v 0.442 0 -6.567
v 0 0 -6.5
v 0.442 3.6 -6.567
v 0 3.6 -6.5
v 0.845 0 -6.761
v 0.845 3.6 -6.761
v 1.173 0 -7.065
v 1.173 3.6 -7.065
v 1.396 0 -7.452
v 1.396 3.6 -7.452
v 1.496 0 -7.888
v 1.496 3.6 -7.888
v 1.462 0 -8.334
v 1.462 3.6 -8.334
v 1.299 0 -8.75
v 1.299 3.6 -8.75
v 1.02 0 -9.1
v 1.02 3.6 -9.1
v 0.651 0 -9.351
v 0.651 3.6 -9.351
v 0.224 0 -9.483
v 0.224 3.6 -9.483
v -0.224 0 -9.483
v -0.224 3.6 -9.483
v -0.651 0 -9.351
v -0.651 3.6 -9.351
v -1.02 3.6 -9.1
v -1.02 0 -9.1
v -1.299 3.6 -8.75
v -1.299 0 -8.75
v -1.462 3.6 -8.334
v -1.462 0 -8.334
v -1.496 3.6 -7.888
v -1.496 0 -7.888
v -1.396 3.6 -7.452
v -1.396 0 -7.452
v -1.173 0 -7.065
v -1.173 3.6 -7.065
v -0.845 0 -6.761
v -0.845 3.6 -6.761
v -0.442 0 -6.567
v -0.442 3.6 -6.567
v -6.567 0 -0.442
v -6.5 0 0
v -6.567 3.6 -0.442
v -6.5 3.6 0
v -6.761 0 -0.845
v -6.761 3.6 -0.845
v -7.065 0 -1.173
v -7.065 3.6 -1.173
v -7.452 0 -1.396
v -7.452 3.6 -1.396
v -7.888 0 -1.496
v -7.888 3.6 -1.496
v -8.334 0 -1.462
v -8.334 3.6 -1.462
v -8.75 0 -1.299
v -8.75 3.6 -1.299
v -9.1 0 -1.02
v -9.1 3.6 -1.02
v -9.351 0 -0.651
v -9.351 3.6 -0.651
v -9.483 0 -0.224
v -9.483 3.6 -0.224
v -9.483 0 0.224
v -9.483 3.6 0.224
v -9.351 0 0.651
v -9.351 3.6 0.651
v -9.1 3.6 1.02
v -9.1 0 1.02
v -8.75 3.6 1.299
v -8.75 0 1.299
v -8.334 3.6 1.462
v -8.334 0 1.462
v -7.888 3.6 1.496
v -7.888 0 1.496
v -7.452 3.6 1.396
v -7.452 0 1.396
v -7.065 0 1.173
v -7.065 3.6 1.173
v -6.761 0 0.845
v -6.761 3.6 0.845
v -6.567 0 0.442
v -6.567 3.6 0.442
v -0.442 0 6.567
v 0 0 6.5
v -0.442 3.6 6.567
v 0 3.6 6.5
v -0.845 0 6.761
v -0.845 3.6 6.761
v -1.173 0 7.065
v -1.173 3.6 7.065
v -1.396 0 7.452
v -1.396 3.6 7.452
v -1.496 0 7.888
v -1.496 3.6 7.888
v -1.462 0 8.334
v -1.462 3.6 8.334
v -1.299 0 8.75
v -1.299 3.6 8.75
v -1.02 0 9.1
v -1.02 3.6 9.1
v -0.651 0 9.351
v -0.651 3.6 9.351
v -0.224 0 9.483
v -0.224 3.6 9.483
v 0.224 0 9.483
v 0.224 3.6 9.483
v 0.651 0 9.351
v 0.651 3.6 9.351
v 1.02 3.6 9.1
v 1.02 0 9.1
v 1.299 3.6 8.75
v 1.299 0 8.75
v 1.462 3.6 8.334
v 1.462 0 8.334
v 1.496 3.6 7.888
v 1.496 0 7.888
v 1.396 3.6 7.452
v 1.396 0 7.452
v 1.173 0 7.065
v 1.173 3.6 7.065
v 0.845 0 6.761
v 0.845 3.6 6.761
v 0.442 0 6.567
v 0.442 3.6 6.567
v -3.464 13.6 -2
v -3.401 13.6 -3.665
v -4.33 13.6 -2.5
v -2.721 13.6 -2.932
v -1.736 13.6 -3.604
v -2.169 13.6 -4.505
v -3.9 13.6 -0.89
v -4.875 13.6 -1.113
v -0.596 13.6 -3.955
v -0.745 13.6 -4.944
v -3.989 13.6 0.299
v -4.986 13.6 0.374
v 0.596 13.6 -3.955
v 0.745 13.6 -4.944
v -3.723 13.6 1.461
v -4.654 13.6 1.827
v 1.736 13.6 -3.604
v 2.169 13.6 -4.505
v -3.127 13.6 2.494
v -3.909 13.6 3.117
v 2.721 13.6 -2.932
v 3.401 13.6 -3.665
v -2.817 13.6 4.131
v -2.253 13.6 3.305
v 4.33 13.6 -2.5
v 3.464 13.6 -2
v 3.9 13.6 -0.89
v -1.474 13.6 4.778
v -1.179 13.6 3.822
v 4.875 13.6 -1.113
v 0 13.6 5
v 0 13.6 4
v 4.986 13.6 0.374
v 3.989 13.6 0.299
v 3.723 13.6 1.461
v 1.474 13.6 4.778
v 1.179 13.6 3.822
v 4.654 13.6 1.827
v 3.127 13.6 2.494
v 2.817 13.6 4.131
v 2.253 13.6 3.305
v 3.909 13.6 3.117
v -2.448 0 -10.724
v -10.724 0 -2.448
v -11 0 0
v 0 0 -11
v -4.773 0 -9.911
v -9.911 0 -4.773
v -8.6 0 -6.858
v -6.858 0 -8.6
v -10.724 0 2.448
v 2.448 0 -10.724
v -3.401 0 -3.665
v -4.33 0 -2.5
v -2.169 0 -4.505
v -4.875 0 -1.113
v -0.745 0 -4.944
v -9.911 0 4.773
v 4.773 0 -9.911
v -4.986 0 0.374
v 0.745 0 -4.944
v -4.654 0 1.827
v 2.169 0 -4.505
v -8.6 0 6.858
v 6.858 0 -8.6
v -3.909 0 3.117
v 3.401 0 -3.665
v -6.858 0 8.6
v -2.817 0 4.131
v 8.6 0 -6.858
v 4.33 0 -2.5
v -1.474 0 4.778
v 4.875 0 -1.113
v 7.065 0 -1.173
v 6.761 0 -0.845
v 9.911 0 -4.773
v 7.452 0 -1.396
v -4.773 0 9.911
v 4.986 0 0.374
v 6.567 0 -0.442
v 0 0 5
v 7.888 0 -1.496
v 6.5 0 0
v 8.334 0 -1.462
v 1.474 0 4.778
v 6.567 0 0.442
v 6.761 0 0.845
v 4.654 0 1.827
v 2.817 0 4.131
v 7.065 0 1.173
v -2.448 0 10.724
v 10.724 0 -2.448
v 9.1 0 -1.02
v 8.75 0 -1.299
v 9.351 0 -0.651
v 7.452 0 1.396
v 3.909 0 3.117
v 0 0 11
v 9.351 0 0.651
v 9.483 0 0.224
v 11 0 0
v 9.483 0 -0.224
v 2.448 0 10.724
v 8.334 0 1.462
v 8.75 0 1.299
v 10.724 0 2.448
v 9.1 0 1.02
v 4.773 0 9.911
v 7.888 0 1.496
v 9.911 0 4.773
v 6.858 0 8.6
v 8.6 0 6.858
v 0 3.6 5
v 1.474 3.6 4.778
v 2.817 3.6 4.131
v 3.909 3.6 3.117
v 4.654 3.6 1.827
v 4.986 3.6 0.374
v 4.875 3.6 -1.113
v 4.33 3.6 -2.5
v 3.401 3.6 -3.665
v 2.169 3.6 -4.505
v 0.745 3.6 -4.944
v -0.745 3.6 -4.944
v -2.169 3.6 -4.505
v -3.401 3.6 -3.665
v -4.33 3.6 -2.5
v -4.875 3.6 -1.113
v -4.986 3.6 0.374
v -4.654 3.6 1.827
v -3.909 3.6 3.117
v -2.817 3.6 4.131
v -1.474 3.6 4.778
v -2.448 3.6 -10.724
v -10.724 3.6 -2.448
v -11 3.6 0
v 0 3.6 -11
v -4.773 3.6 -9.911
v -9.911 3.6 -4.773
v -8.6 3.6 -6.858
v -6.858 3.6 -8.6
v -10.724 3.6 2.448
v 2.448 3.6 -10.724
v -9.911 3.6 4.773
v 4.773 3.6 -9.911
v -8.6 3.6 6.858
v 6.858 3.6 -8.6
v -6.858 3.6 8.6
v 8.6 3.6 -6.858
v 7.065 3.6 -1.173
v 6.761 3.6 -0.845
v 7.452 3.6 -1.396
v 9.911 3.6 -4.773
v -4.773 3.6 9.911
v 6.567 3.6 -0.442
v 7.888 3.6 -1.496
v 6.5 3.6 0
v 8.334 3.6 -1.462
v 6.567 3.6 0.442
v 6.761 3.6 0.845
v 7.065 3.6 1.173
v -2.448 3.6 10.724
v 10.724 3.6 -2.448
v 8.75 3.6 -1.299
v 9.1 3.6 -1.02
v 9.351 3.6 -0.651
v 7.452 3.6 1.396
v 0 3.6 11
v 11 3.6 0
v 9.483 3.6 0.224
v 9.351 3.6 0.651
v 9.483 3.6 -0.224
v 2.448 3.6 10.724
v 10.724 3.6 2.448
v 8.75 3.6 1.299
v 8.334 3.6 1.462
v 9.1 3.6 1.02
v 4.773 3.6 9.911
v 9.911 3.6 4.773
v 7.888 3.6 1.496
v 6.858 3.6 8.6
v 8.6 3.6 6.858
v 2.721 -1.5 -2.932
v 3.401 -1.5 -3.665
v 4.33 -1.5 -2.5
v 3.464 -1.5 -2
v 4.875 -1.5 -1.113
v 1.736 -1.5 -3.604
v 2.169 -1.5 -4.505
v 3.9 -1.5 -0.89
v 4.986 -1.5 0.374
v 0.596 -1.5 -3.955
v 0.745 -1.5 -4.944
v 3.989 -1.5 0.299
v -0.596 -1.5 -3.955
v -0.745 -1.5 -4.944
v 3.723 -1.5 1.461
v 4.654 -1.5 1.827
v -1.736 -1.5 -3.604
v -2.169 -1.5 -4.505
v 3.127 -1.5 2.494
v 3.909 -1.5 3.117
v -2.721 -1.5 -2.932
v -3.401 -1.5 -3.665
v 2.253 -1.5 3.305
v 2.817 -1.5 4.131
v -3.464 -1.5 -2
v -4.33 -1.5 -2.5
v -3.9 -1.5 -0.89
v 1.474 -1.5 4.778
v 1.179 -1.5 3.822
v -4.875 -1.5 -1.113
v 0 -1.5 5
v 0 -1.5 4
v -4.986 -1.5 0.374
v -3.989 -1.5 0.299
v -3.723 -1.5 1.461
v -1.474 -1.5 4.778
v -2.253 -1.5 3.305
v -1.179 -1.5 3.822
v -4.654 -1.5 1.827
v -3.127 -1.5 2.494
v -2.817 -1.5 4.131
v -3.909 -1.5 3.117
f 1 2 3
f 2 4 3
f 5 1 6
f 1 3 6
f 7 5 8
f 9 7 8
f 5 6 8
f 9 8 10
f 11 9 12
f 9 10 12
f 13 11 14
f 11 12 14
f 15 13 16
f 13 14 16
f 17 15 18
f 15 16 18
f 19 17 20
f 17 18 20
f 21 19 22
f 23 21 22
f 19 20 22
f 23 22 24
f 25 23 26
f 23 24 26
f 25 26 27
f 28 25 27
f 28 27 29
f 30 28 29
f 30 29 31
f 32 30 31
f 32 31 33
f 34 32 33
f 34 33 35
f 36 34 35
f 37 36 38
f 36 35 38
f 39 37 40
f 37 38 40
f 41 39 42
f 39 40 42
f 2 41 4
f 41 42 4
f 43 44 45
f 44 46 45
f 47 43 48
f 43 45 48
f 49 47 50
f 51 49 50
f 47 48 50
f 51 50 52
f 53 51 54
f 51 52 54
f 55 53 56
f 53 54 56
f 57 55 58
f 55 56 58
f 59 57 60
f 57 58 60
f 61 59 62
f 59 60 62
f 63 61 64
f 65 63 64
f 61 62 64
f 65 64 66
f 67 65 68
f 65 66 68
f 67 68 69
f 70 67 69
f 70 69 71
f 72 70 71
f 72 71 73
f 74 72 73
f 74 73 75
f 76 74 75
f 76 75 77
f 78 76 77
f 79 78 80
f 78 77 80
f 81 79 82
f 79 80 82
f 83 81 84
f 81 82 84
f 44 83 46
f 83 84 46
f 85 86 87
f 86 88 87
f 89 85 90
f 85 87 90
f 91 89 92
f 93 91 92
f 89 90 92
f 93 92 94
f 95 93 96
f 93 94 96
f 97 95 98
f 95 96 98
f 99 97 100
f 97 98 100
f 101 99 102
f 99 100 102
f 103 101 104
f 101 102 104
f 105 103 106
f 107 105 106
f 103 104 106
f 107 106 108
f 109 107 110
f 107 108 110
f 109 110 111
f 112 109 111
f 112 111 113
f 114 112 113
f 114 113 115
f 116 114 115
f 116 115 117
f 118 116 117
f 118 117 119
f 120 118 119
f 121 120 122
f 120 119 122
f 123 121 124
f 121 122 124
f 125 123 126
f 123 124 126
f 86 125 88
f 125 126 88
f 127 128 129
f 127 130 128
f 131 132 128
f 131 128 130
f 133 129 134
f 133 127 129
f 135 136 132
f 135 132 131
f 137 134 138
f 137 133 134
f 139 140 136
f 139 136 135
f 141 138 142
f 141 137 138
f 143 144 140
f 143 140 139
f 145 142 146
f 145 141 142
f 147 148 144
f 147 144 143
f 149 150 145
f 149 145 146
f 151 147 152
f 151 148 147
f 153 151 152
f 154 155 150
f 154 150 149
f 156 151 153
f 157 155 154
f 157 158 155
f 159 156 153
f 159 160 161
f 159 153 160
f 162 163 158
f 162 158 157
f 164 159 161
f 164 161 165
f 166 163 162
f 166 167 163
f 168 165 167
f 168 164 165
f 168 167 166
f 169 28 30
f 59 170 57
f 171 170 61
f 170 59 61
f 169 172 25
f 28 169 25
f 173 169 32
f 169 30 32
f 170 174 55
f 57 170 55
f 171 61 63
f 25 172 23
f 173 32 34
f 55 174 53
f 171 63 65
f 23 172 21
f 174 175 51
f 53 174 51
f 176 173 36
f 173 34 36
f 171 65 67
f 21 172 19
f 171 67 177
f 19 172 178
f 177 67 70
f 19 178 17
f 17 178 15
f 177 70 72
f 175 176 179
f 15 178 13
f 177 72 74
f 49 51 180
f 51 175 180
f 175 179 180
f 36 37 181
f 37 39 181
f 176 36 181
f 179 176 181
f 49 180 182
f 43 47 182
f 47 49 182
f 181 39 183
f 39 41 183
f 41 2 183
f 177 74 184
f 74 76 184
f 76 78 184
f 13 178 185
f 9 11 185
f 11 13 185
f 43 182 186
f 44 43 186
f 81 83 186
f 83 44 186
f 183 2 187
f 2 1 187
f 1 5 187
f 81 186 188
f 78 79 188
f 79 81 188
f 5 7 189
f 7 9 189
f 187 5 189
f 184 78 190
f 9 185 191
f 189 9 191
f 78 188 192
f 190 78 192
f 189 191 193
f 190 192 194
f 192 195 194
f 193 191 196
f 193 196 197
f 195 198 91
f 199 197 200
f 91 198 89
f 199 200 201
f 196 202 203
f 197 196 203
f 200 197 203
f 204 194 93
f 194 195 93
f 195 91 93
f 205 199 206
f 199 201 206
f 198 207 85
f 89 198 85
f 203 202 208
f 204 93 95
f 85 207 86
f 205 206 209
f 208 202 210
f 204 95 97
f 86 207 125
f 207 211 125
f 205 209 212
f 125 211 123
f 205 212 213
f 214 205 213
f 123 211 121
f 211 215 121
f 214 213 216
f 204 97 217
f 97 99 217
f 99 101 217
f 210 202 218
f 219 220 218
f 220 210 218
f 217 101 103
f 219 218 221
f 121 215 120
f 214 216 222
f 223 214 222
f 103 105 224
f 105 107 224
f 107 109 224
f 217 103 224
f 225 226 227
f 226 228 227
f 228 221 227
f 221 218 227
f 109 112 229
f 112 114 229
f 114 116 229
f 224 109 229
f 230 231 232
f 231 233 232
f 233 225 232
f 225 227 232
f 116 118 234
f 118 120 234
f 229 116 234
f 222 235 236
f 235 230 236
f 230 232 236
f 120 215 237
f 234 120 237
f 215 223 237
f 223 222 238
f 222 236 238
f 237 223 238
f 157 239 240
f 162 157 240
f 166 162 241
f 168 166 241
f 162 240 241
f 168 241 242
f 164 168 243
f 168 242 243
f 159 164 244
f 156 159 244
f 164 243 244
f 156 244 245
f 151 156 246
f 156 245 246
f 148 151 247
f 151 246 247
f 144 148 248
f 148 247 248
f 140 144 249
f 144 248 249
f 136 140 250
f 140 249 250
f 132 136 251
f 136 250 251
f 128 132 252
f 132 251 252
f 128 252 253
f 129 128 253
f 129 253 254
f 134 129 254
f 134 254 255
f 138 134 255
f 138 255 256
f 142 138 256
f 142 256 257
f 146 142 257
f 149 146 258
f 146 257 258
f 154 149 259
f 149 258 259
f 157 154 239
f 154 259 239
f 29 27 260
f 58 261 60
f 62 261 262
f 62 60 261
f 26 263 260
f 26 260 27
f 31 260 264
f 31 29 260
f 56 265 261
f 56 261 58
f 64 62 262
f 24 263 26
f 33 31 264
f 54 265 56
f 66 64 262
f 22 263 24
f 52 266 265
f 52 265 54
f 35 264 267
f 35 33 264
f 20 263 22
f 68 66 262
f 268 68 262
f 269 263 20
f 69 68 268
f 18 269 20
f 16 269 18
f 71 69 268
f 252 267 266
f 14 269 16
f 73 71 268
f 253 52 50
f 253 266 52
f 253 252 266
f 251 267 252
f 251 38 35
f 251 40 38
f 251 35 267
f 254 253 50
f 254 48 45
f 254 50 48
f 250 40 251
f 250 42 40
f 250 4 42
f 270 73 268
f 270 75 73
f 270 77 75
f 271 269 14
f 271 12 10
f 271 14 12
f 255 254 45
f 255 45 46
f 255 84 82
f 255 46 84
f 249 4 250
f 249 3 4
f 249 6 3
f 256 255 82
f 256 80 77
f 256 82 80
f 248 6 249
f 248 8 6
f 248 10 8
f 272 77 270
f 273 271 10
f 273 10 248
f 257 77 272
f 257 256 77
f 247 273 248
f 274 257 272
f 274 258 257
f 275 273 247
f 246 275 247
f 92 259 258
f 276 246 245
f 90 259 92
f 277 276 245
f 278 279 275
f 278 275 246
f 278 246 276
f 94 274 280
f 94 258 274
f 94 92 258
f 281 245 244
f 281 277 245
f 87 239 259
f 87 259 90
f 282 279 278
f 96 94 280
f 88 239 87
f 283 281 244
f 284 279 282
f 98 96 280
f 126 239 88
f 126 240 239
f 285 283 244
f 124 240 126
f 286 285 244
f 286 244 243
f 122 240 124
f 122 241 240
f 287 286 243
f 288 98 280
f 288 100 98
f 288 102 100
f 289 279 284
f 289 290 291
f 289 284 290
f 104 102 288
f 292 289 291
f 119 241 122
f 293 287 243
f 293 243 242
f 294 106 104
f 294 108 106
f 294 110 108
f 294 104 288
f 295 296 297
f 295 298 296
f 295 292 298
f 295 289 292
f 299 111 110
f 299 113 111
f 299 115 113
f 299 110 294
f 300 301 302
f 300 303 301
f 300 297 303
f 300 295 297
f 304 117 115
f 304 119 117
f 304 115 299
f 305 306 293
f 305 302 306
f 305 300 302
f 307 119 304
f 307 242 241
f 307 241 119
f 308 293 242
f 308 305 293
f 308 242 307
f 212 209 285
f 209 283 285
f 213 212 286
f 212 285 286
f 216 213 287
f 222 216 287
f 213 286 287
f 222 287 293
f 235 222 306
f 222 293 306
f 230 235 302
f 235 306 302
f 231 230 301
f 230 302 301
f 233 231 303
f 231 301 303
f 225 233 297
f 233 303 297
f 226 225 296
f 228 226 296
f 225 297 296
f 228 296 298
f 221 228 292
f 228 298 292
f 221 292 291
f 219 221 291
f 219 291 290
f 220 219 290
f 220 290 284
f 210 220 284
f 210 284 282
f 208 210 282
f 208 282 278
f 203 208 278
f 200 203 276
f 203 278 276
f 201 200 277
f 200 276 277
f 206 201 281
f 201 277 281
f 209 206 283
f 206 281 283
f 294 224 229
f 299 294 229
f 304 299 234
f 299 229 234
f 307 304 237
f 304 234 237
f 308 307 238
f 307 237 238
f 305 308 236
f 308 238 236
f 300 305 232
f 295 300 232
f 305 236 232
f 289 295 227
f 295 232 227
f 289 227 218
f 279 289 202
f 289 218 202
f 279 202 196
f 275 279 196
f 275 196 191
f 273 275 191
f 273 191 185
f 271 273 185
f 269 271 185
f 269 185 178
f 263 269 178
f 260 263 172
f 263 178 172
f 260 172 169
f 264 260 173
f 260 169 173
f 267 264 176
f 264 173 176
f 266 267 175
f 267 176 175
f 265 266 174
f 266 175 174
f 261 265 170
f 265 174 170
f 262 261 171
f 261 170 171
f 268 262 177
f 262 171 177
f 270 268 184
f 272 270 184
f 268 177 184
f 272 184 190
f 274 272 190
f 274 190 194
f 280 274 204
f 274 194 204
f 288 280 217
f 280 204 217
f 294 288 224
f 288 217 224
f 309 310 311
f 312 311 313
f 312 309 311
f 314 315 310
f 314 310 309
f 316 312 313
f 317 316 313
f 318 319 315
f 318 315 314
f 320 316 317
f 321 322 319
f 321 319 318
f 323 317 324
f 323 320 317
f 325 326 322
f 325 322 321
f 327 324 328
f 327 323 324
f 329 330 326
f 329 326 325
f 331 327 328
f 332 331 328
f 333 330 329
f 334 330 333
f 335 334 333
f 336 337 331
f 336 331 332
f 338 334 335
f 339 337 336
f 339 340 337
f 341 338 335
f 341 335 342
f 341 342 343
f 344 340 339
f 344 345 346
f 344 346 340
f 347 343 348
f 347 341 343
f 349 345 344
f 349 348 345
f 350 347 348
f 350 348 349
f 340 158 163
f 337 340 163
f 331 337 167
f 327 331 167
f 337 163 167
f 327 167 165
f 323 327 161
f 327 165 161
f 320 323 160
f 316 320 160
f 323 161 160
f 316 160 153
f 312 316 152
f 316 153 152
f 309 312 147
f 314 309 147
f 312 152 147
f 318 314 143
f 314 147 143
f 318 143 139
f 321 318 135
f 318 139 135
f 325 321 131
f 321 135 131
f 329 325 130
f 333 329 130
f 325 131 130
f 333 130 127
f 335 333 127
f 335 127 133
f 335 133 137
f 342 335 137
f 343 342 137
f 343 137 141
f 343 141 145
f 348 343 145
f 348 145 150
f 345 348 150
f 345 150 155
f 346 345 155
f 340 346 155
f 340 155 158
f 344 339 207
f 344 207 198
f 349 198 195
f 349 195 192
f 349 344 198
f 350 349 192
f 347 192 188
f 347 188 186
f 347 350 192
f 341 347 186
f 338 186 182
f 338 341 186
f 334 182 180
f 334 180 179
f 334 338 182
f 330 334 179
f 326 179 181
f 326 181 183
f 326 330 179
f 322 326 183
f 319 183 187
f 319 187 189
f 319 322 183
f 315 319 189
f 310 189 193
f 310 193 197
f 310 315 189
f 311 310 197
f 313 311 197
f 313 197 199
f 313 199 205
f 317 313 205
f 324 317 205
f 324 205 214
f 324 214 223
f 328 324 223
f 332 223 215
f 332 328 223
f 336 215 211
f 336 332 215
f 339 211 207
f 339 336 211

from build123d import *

# Parameters (mm, degrees)
SKETCH1_R           = 11
BOSS_EXTRUDE1_DEPTH = 3.6
SKETCH2_R           = 5
BOSS_EXTRUDE2_DEPTH = 10
BOSS_EXTRUDE3_START = 1.5
SKETCH3_R           = 5
BOSS_EXTRUDE3_DEPTH = 1.5
SKETCH4_R           = 4
CUT_EXTRUDE1_DEPTH  = 22.67971402
SKETCH5_R           = 1.5
CUT_EXTRUDE2_DEPTH  = 19.493242009
CIRPATTERN1_COUNT   = 4


with BuildPart() as part:
    # Sketch1 → Boss-Extrude1 (new body)
    with BuildSketch(Plane(origin=(0, 0, 0), x_dir=(1, 0, 0), z_dir=(0, 1, 0))):
        with Locations(Location((0, 0, 0), (0, 0, 270))):
            Circle(SKETCH1_R)
    extrude(amount=BOSS_EXTRUDE1_DEPTH)

    # Sketch2 → Boss-Extrude2 (add)
    with BuildSketch(Plane(origin=(0, 3.6, 0), x_dir=(1, 0, 0), z_dir=(0, 1, 0))):
        with Locations(Location((0, 0, 0), (0, 0, 270))):
            Circle(SKETCH2_R)
    extrude(amount=BOSS_EXTRUDE2_DEPTH)

    # Sketch3 → Boss-Extrude3 (add)
    with BuildSketch(Plane.XZ.offset(BOSS_EXTRUDE3_START)):
        with Locations(Location((0, 0, 0), (0, 0, 90))):
            Circle(SKETCH3_R)
    extrude(amount=-BOSS_EXTRUDE3_DEPTH)

    # Sketch4 → Cut-Extrude1 (cut, through all)
    with BuildSketch(Plane(origin=(0, 13.6, 0), x_dir=(1, 0, 0), z_dir=(0, 1, 0))):
        with Locations(Location((0, 0, 0), (0, 0, 270))):
            Circle(SKETCH4_R)
    extrude(amount=-CUT_EXTRUDE1_DEPTH, mode=Mode.SUBTRACT)

    # Sketch5 → Cut-Extrude2 (cut, symmetric)
    with BuildSketch(Plane(origin=(0, 3.6, 0), x_dir=(1, 0, 0), z_dir=(0, 1, 0))):
        with Locations(Location((0, 8, 0), (0, 0, 270))):
            Circle(SKETCH5_R)
    cut_extrude2 = extrude(amount=CUT_EXTRUDE2_DEPTH, both=True, mode=Mode.SUBTRACT)

    # CirPattern1: Cut-Extrude2 ×4 about axis
    cirpattern1_axis = Axis((0, 0, 0), (0, 1, 0))
    for i in range(1, CIRPATTERN1_COUNT):
        add(cut_extrude2.rotate(cirpattern1_axis, i * 360 / CIRPATTERN1_COUNT), mode=Mode.SUBTRACT)


solid = part.part
